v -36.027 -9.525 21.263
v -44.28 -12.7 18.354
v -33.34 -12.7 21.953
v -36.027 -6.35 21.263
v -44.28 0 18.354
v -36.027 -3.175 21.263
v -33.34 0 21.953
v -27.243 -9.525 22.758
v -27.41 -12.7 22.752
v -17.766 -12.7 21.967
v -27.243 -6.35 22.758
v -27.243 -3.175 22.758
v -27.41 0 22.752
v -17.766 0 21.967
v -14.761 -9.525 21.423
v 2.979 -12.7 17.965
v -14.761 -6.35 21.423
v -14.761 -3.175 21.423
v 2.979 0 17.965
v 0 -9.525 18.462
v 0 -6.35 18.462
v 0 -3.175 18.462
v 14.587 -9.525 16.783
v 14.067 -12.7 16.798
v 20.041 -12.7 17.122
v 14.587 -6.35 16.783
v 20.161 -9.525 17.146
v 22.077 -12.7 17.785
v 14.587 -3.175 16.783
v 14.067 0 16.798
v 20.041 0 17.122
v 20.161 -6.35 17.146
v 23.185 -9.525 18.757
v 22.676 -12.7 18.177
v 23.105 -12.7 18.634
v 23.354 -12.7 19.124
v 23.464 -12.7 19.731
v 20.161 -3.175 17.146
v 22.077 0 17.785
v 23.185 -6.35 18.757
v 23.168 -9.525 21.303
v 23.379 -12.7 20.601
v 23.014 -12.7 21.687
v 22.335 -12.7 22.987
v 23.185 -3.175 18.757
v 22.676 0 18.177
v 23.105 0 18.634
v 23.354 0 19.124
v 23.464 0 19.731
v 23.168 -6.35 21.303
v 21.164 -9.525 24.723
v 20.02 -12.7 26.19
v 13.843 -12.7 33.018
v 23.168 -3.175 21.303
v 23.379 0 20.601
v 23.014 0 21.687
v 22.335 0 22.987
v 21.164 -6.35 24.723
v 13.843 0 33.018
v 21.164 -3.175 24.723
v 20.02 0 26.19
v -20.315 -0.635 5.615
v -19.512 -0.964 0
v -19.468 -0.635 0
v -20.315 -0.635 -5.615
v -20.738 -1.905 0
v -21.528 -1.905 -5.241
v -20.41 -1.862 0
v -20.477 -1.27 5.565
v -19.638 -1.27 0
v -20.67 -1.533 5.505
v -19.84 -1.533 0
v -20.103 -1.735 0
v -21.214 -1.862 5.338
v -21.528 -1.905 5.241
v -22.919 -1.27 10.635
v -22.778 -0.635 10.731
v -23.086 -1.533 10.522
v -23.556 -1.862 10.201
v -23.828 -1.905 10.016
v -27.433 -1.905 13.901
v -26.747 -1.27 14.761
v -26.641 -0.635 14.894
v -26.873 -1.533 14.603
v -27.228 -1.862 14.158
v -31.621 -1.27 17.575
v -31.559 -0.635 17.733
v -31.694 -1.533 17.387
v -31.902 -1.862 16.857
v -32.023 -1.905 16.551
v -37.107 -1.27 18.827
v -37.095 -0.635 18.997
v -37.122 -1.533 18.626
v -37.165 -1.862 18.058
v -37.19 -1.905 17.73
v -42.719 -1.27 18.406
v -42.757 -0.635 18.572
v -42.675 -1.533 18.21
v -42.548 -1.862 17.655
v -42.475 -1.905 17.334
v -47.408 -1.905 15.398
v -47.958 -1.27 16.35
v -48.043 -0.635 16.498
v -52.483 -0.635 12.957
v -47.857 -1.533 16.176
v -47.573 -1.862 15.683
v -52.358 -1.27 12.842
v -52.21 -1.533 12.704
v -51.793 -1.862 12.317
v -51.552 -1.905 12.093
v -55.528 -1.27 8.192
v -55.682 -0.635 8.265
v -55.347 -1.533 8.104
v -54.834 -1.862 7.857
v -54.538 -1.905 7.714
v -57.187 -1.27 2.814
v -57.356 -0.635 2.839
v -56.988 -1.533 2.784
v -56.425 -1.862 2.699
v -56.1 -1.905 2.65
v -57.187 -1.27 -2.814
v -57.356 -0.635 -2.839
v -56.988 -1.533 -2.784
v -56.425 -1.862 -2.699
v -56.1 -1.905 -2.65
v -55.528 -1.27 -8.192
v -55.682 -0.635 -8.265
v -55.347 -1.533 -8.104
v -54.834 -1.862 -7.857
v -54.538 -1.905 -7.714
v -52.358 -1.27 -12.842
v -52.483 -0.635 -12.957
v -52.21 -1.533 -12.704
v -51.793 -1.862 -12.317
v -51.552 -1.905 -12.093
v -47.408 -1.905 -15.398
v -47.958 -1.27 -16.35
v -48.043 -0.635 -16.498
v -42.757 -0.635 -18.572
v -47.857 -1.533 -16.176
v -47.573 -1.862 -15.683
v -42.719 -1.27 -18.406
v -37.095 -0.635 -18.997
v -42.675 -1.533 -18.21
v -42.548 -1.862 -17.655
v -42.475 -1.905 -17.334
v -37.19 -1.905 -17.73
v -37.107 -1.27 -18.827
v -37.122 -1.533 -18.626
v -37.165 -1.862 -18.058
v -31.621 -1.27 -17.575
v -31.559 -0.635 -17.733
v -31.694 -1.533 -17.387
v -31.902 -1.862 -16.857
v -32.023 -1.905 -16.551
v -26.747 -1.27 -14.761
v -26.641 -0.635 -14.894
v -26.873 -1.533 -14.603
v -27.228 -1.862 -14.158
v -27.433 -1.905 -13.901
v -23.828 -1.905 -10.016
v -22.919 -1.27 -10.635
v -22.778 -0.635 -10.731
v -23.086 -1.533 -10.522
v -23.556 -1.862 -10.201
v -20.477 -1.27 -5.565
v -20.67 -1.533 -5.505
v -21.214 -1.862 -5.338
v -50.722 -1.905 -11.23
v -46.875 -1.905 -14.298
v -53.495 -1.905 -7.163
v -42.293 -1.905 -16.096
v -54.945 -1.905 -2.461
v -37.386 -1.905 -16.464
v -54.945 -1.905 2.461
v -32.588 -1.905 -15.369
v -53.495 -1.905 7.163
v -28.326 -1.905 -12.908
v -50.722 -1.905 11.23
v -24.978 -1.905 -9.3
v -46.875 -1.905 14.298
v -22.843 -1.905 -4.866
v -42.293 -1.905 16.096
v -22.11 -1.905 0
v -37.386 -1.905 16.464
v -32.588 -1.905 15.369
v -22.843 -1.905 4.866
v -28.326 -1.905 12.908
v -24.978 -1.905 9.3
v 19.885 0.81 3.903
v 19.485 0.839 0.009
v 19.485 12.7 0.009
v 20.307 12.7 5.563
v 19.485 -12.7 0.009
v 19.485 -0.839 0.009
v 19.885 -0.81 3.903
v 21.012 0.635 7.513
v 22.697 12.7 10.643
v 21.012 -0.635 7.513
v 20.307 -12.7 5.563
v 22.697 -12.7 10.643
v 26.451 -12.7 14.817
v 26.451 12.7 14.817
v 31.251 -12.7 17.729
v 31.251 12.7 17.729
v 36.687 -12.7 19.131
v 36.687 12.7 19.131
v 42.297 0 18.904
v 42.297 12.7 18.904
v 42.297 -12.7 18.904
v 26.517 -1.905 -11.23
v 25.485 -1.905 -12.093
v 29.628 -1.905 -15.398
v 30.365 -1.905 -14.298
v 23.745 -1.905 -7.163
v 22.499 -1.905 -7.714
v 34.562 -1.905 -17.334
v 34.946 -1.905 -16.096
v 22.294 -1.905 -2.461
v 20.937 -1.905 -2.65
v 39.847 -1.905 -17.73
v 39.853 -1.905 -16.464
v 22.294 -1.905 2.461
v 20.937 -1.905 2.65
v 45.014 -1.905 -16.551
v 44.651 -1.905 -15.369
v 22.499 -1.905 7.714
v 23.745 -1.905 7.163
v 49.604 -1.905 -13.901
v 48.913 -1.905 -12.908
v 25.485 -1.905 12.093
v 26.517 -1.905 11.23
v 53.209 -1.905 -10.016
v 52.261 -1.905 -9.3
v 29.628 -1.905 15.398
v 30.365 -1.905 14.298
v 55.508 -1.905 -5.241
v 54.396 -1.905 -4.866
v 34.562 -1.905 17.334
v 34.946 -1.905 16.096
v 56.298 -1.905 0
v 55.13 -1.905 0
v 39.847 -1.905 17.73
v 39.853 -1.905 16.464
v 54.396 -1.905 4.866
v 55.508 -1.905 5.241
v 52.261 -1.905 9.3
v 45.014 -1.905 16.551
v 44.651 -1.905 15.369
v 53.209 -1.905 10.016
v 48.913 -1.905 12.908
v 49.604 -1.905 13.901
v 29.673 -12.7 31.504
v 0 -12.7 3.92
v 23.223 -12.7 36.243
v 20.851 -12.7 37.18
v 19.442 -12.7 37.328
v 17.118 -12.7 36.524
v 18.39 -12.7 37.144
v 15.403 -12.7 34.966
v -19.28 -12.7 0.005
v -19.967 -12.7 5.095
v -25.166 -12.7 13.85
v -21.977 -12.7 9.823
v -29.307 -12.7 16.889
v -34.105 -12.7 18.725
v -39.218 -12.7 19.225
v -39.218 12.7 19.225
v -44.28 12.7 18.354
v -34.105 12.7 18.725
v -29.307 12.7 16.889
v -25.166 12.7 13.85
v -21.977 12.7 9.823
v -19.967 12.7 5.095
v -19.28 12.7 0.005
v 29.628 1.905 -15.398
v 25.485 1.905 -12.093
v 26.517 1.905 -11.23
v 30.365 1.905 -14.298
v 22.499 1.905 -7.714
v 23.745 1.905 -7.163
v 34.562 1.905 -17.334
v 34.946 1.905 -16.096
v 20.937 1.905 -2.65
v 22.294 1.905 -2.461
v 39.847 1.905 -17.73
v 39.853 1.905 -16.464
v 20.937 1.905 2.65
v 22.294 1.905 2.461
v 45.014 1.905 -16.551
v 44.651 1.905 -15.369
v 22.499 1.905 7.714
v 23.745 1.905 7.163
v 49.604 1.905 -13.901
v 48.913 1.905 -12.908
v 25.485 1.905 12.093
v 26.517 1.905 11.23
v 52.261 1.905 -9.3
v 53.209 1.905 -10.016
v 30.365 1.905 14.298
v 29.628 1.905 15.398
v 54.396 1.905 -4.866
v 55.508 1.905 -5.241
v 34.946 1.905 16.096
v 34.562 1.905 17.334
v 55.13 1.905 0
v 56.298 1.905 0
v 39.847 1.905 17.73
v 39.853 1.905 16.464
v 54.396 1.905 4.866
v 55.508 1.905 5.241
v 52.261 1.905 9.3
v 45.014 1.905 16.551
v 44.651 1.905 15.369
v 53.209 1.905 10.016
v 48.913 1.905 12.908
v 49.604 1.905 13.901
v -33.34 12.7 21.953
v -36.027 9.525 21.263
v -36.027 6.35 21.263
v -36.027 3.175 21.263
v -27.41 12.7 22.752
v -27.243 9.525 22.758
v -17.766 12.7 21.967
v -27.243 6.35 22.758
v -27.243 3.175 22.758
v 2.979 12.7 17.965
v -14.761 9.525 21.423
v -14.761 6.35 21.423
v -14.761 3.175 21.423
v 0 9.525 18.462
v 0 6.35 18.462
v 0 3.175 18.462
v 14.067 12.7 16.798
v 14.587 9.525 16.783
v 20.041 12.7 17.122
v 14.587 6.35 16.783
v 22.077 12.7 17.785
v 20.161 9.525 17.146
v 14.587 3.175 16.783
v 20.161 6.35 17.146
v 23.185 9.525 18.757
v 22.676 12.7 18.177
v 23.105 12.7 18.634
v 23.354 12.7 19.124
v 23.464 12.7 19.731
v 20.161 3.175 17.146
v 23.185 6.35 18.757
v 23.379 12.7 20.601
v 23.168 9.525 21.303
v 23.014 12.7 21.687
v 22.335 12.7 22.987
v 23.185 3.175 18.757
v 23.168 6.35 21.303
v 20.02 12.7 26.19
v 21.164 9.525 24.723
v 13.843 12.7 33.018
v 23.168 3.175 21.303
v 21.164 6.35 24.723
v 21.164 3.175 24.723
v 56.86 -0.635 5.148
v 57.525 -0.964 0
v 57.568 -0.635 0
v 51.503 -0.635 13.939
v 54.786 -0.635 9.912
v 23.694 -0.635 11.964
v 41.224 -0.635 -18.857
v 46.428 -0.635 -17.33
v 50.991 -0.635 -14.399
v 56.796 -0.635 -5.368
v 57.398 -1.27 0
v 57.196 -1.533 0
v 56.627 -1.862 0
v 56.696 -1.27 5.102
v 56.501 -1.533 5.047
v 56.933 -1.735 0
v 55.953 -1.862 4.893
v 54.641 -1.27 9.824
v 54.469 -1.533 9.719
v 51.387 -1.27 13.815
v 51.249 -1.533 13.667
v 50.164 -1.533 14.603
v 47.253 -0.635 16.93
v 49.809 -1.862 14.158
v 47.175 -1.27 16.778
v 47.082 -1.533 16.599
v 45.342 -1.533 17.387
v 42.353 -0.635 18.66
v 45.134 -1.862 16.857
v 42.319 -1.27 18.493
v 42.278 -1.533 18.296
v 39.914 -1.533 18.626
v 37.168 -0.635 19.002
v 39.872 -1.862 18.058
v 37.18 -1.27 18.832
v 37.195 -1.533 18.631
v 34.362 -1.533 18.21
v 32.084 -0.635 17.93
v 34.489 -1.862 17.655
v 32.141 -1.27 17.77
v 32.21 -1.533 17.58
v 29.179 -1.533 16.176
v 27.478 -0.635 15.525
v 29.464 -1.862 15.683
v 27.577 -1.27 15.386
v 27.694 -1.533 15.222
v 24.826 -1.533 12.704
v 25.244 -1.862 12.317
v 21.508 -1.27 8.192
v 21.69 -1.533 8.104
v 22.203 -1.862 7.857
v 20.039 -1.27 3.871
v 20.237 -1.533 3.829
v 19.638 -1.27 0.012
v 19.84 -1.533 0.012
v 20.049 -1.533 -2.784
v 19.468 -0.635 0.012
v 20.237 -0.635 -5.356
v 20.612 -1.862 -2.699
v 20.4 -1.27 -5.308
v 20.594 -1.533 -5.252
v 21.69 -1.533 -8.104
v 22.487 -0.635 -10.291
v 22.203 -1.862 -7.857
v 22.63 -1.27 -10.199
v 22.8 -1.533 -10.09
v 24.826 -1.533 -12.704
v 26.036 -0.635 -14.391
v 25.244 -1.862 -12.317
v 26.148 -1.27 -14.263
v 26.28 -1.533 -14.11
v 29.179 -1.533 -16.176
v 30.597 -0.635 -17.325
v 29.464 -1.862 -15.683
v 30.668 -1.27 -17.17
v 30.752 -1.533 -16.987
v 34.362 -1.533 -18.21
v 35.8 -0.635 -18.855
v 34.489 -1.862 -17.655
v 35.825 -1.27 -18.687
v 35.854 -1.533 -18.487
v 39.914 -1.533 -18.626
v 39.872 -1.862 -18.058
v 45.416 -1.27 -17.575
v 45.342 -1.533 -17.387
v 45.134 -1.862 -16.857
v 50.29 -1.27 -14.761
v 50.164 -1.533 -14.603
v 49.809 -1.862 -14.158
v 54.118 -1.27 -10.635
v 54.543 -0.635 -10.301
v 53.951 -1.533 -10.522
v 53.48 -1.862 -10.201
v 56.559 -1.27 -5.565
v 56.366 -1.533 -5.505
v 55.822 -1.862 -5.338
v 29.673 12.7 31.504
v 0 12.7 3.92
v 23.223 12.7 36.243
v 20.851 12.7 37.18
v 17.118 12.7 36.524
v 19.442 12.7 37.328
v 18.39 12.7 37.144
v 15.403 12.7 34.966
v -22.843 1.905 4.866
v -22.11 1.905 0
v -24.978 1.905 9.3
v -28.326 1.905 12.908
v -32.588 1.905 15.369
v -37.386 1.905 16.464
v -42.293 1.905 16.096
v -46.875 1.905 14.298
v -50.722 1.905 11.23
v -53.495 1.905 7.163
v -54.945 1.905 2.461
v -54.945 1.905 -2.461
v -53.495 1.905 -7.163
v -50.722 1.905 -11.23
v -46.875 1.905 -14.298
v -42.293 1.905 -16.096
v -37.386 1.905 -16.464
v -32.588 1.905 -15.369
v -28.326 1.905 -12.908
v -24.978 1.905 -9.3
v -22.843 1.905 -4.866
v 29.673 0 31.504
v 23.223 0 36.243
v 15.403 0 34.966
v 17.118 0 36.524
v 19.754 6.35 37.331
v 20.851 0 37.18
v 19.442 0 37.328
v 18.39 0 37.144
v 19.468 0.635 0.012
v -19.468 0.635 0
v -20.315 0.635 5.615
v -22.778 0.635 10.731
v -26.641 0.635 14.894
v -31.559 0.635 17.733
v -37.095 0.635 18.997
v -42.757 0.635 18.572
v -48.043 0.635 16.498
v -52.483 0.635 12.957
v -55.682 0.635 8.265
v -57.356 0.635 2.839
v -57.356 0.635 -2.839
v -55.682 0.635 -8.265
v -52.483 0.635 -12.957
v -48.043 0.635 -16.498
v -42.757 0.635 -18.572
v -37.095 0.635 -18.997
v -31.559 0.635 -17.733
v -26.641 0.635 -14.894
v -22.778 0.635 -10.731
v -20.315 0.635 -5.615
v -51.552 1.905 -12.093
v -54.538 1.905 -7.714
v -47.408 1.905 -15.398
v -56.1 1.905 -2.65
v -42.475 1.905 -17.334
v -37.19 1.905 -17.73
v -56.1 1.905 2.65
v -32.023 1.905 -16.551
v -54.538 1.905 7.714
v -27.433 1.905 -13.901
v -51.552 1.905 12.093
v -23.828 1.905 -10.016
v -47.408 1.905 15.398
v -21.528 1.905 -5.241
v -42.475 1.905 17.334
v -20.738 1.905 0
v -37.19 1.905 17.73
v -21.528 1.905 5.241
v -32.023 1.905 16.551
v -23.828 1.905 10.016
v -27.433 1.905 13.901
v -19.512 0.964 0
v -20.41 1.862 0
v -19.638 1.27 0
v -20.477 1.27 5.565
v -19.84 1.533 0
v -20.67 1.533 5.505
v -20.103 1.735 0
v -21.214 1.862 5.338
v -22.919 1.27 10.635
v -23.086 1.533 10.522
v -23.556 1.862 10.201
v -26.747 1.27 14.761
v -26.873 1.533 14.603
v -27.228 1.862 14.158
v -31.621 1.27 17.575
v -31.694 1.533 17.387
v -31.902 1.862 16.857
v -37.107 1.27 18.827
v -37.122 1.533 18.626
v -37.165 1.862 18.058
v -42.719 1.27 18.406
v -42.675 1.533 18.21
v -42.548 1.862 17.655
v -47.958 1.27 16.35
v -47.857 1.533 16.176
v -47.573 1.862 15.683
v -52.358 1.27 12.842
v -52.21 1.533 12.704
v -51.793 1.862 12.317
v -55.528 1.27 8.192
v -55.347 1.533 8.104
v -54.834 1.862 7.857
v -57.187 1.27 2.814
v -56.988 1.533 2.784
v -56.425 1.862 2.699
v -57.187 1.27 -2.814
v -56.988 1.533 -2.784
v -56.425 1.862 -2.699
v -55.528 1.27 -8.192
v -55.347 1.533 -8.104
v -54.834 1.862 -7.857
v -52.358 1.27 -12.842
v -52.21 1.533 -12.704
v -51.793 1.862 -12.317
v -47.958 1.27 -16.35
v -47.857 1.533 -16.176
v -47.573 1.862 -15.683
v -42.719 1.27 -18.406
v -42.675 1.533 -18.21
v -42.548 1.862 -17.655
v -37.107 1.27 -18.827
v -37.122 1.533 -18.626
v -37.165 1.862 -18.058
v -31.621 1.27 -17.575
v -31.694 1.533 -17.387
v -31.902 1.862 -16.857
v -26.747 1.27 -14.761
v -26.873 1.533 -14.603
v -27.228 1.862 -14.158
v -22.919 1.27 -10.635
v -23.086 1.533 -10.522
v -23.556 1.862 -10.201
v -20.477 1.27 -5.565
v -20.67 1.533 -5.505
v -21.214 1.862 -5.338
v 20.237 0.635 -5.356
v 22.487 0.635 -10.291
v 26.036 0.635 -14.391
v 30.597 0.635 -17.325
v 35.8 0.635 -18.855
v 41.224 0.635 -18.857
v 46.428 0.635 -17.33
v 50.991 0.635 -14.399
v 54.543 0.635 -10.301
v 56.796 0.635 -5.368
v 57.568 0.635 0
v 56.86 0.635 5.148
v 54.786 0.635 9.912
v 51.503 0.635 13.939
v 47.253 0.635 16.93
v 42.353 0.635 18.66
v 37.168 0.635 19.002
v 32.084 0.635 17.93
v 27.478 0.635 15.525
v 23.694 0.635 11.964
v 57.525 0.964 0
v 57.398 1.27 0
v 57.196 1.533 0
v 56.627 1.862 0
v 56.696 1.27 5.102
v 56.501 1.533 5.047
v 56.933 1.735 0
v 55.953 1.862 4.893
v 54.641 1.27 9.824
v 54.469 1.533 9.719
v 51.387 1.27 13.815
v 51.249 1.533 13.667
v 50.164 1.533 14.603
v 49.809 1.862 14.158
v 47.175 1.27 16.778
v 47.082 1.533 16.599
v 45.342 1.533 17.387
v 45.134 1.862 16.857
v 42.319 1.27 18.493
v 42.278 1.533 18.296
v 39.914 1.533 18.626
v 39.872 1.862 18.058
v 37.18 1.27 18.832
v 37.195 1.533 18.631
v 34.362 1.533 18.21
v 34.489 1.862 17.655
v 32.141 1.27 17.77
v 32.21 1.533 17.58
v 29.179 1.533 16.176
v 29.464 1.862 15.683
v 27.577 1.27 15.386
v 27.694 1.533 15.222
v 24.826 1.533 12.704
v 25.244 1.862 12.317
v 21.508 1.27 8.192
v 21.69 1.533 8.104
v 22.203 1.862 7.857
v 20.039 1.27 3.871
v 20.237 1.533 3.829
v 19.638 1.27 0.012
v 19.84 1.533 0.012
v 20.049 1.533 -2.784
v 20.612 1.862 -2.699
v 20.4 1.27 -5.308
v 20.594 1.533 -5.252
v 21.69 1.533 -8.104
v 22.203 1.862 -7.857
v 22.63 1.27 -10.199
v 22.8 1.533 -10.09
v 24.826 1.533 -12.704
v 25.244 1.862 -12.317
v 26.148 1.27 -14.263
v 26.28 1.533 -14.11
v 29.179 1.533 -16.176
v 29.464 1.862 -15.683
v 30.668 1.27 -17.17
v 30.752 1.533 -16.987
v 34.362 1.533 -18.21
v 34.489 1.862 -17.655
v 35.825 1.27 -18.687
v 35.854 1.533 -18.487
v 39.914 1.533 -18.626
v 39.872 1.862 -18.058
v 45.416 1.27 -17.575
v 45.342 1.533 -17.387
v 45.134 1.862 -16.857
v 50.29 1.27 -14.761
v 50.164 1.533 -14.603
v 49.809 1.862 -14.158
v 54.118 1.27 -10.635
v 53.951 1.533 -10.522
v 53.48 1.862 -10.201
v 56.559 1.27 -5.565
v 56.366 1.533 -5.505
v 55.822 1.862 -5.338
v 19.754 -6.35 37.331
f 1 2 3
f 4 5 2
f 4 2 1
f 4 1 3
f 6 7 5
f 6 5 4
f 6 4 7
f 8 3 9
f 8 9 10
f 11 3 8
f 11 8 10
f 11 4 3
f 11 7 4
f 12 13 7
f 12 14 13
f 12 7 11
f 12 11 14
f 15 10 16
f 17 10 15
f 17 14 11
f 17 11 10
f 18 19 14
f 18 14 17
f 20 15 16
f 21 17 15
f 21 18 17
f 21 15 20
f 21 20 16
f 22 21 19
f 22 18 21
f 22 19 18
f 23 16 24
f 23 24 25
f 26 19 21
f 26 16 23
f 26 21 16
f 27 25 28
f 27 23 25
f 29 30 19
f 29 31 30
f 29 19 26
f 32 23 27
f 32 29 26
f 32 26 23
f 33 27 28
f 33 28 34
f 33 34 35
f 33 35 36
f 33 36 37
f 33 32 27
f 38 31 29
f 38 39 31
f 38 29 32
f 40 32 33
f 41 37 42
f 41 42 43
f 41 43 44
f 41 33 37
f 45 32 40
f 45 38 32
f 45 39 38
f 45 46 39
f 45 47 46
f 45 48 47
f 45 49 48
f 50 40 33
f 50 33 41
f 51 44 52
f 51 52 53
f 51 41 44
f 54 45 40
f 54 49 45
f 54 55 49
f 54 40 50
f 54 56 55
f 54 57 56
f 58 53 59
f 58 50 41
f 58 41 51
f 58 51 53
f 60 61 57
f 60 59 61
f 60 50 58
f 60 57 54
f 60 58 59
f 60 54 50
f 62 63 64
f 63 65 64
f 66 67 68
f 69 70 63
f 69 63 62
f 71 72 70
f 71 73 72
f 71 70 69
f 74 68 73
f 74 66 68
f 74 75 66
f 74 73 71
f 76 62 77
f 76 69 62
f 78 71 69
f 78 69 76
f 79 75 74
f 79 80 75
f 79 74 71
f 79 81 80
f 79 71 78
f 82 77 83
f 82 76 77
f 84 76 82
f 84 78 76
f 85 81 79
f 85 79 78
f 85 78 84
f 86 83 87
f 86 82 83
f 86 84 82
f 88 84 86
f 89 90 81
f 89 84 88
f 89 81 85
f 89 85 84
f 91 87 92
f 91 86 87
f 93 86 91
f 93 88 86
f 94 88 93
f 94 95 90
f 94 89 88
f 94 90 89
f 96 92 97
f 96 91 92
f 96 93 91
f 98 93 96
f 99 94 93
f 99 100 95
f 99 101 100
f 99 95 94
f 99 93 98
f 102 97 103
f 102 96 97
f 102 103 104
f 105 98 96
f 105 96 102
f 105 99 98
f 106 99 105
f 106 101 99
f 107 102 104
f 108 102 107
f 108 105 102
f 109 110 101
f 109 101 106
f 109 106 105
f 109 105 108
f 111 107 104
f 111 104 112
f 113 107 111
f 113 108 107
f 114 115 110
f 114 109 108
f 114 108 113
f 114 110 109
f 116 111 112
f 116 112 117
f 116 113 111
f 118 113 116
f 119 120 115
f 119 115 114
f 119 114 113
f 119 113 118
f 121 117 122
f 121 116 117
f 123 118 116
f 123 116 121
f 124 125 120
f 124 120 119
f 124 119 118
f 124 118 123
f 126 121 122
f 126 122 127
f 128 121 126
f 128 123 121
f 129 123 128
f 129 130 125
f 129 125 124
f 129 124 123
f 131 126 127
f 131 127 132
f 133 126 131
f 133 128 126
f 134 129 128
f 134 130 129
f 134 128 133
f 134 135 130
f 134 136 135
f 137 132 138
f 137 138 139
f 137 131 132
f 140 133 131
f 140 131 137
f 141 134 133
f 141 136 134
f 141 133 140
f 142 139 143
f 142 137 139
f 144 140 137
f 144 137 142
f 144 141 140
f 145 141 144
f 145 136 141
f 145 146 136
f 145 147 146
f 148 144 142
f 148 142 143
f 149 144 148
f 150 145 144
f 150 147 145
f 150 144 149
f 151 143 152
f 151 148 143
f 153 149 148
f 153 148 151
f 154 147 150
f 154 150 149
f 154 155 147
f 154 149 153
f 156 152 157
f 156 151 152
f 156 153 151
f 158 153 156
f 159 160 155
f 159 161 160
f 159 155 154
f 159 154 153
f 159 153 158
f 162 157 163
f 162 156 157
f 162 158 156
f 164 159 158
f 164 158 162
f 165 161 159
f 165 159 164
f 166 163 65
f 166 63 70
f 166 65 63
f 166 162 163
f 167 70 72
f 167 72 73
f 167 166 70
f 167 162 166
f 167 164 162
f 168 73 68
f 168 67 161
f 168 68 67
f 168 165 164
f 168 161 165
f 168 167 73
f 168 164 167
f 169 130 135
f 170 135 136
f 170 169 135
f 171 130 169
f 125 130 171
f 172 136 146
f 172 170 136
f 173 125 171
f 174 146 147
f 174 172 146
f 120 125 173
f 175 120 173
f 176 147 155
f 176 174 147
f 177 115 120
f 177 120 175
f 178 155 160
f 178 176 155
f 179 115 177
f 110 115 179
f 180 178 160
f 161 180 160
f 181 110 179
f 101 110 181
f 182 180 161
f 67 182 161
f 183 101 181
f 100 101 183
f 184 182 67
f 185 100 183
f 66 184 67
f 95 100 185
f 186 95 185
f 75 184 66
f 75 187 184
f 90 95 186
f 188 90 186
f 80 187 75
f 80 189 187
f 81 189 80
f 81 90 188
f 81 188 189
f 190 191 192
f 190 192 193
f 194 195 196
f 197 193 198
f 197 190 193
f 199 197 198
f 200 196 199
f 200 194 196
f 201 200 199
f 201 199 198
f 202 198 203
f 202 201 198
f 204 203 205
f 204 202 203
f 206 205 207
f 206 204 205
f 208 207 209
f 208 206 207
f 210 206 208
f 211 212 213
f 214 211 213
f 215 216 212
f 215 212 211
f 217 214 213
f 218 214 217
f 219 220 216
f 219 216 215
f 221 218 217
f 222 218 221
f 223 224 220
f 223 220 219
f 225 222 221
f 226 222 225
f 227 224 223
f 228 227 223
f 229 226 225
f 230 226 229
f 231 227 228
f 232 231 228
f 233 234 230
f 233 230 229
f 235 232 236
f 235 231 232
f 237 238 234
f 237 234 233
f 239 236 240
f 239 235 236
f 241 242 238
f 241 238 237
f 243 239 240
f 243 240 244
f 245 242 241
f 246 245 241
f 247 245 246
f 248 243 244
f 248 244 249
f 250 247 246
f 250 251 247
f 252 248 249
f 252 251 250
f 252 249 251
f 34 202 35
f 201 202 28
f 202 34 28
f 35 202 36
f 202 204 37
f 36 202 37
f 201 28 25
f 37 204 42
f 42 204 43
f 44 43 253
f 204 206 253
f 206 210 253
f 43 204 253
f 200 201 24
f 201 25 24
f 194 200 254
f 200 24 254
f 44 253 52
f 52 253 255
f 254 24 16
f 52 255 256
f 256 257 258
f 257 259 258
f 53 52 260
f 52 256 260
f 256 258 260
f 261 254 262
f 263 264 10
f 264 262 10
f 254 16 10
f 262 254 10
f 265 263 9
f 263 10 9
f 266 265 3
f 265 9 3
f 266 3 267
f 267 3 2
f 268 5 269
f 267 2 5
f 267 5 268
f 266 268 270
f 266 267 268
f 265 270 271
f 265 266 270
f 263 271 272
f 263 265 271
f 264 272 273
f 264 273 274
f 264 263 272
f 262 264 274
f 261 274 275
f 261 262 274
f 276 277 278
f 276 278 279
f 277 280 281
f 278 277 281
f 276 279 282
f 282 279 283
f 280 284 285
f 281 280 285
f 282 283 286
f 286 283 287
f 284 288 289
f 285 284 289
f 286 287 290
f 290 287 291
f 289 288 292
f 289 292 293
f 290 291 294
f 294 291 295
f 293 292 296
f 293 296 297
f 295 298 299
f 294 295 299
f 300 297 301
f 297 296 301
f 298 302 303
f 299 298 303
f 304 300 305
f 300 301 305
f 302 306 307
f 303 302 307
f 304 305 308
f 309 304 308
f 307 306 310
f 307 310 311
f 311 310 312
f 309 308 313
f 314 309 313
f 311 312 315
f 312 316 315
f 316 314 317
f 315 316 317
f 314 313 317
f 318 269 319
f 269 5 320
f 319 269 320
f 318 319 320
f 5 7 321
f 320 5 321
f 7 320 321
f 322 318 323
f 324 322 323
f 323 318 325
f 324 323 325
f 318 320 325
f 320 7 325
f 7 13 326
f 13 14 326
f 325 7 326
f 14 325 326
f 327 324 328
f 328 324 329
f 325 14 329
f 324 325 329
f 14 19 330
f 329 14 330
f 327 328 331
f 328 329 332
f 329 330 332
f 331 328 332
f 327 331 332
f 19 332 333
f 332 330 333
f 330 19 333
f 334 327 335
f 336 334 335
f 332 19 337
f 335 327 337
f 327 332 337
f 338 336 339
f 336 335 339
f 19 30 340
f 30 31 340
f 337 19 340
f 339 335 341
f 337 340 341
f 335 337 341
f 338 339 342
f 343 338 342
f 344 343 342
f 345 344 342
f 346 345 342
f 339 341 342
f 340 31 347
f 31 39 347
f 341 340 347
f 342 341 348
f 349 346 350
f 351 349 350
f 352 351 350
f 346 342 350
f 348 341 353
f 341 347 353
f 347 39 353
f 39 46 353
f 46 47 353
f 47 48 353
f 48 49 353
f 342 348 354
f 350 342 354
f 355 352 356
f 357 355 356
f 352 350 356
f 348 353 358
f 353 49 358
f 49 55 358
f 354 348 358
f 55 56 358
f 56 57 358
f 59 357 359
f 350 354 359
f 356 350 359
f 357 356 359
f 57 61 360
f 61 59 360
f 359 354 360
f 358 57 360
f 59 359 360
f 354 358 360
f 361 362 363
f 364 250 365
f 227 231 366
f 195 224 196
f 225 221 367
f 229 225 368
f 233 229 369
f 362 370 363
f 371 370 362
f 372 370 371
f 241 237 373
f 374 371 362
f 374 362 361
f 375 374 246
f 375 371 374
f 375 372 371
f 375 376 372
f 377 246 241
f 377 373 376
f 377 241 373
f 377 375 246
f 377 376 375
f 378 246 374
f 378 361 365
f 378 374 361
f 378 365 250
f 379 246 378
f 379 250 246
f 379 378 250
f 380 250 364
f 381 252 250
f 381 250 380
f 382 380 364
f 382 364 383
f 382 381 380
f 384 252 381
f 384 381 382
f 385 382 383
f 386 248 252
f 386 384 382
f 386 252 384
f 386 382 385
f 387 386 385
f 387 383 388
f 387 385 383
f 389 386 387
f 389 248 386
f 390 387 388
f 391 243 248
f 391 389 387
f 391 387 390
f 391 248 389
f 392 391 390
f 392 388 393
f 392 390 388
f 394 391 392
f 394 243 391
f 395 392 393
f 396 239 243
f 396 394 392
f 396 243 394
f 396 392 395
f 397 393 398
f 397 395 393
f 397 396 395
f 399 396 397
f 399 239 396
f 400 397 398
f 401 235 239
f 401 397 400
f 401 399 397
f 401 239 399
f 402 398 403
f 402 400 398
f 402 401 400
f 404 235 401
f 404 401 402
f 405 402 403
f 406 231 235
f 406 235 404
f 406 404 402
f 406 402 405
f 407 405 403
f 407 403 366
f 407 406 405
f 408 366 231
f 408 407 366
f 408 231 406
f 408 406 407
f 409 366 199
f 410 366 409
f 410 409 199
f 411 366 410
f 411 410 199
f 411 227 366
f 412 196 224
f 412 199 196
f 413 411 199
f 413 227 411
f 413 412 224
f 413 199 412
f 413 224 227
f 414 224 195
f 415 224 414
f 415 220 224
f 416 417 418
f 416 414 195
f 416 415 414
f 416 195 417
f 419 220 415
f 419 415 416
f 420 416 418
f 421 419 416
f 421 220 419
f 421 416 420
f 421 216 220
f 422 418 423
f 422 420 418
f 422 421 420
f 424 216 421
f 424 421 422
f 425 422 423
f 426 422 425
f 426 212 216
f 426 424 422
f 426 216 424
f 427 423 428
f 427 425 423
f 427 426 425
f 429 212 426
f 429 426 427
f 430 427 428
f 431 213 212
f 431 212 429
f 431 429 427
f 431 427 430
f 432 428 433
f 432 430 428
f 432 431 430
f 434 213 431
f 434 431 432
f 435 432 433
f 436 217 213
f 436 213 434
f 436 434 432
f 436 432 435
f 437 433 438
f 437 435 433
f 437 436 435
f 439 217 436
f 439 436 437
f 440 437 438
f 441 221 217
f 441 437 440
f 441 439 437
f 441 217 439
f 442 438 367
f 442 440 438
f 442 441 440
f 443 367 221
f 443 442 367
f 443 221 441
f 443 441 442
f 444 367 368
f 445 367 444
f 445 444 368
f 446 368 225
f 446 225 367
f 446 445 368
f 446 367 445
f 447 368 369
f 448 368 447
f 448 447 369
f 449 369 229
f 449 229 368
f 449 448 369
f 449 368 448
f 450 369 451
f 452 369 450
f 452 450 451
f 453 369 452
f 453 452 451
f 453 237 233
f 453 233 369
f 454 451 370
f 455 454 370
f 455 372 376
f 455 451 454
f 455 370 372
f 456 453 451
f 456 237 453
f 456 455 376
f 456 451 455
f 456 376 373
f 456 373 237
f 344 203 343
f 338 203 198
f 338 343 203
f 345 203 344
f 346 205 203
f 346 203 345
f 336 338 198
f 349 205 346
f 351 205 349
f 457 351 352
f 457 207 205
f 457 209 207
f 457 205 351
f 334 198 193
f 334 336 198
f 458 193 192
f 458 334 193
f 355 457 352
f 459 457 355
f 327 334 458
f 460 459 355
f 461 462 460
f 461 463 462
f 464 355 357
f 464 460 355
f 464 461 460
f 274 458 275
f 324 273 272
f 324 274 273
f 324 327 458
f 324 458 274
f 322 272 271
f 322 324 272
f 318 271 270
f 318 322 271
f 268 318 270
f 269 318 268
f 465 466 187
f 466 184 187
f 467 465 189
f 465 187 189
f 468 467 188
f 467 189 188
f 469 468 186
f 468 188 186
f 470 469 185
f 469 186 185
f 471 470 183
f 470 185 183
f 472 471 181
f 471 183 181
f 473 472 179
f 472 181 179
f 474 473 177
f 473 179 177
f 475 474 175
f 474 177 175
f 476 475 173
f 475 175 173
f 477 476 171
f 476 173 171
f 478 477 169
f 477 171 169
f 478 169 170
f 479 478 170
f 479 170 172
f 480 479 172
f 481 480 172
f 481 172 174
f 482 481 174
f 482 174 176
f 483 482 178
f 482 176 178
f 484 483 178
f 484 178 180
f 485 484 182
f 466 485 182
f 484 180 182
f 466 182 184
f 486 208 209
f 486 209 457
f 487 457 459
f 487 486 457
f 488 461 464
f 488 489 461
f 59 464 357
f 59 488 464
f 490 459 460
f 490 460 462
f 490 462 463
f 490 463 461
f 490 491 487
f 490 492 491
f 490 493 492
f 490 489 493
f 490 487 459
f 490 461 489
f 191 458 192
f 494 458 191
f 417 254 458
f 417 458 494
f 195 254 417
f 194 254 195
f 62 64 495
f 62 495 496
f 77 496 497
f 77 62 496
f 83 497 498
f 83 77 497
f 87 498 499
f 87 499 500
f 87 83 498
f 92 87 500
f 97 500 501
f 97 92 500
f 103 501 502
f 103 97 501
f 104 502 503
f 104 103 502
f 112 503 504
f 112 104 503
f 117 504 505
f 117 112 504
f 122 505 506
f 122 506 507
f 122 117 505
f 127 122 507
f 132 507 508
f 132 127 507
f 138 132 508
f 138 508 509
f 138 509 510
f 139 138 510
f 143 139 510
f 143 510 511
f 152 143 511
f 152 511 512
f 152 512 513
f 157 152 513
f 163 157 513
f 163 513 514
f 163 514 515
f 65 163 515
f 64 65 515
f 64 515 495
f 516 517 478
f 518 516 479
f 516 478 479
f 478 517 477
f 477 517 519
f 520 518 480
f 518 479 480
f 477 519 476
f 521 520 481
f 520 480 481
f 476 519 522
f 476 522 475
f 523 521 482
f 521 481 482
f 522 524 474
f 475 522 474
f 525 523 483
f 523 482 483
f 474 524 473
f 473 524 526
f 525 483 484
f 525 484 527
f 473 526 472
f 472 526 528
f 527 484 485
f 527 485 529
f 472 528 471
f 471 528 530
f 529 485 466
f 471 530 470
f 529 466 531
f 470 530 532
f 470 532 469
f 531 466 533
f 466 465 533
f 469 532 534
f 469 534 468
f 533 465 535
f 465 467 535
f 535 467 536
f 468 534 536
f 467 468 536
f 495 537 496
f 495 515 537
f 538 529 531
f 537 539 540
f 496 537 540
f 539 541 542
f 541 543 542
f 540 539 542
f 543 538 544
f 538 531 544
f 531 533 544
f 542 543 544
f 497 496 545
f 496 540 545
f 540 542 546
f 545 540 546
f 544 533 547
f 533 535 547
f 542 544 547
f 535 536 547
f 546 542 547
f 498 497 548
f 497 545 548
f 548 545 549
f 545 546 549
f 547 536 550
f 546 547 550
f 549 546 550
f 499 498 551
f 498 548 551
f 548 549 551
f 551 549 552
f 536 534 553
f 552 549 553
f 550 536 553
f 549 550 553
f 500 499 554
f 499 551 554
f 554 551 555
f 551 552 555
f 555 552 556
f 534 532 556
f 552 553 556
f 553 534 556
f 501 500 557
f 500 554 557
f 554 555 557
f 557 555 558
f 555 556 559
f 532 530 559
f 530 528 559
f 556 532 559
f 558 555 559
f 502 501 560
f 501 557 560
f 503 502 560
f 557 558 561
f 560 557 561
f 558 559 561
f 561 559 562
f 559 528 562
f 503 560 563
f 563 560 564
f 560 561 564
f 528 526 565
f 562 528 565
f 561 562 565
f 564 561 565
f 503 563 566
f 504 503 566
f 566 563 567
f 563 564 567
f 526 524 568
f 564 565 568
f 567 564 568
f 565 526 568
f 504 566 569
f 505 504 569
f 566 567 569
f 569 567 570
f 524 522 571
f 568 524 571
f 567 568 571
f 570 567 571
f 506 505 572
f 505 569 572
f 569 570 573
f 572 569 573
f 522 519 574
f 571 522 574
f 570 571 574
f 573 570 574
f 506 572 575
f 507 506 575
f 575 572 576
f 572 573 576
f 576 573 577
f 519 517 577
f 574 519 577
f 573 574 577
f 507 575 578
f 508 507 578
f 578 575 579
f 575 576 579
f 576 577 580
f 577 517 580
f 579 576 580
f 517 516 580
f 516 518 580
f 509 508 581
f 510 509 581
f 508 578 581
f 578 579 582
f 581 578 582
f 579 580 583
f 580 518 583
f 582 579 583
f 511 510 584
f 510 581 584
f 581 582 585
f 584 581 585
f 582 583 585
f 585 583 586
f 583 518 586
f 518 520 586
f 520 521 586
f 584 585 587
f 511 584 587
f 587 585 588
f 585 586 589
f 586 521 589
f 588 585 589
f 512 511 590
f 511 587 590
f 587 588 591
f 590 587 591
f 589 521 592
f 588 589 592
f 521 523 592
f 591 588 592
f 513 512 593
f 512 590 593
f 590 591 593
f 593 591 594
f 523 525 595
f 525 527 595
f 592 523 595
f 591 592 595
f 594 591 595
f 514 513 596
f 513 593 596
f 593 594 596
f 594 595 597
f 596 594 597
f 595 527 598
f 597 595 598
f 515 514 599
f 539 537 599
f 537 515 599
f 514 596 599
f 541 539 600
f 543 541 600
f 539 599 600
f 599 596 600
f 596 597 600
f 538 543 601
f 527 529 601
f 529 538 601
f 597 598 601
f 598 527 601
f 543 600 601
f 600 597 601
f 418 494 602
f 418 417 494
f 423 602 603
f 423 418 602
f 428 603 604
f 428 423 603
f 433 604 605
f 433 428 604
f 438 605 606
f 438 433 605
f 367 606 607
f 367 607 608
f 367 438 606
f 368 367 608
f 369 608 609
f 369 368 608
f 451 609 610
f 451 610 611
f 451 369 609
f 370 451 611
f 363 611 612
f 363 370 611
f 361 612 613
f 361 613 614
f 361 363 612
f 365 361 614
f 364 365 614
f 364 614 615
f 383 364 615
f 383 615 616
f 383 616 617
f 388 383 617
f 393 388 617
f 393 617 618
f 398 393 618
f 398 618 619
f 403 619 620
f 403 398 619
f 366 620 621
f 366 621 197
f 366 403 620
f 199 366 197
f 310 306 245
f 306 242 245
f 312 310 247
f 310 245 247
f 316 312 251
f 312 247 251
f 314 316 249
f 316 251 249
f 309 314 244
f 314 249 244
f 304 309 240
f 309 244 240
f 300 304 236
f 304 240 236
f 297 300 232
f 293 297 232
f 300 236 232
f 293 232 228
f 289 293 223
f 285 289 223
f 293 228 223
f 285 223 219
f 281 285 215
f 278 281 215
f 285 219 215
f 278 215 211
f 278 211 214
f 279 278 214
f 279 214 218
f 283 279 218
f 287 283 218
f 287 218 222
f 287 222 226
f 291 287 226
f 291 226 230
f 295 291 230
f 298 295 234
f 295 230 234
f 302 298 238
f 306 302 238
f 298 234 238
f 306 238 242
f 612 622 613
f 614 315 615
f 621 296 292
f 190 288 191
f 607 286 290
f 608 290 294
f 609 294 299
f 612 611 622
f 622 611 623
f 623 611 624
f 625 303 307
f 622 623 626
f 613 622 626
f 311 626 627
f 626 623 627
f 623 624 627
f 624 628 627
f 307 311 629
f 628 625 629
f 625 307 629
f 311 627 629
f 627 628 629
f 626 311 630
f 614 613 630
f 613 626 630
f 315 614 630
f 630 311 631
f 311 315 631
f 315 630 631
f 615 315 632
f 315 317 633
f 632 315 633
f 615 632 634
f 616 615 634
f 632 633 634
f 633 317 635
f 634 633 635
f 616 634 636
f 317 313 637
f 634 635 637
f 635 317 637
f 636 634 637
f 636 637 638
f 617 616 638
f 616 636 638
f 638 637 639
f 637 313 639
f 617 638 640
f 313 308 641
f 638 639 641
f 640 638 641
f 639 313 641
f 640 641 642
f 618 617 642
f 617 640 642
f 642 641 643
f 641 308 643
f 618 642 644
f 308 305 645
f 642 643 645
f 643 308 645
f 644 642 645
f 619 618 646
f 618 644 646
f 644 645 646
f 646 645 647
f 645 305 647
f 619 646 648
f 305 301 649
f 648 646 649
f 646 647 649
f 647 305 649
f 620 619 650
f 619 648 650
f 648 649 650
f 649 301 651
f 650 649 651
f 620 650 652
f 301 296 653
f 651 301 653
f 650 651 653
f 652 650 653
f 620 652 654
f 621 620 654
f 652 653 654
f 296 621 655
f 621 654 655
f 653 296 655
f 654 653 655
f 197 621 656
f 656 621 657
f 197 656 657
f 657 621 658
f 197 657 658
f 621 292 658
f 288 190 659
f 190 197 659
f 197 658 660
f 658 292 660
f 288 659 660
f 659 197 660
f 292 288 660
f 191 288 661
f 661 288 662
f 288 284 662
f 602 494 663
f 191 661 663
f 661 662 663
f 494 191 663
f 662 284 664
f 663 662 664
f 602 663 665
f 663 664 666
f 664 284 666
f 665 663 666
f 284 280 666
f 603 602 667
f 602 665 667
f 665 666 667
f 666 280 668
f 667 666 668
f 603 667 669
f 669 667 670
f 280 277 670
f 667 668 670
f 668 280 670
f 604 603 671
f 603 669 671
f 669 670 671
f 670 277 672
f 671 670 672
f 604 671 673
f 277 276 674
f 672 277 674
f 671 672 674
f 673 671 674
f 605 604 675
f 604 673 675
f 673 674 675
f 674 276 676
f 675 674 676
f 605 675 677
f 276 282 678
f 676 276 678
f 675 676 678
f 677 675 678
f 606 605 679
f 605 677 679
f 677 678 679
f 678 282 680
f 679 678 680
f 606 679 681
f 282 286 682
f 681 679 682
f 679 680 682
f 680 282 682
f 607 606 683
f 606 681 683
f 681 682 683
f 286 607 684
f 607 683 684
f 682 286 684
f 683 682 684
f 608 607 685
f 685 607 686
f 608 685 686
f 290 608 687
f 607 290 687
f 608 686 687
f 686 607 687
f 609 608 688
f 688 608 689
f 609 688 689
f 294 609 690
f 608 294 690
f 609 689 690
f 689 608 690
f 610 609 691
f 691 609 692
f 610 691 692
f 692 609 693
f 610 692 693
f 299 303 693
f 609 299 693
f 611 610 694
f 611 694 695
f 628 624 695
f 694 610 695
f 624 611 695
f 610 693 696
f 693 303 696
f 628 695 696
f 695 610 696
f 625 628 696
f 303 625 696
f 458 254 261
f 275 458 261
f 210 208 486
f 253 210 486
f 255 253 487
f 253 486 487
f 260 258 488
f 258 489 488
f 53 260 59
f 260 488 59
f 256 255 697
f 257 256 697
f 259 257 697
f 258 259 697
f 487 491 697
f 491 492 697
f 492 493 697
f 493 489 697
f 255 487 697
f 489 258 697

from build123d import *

# Parameters (mm, degrees)
F0_R     = 19.05
F2_DEPTH = 1.905
F1_R     = 16.51
F3_DEPTH = 2.54
F4_R     = 1.27
F4_2_R   = 1.27
F6_DEPTH = 12.7


with BuildPart() as f2:
    # F0 (on Front) → F2 (new body, symmetric)
    with BuildSketch(Plane.XZ):
        with Locations((-38.5182765663, 0)):
            Circle(F0_R)
    extrude(amount=F2_DEPTH, both=True)


with BuildPart() as f2b:
    # F0 (on Front) → F2, piece 2 (new body, symmetric)
    with BuildSketch(Plane.XZ):
        with Locations((38.5182765663, 0)):
            Circle(F0_R)
    extrude(amount=F2_DEPTH, both=True)


with BuildPart() as f3_tool:
    # F1 (on face) → F3 (new body, symmetric)
    with BuildSketch(Plane.XZ):
        with Locations((38.6195555329, 0)):
            Circle(F1_R)
        with Locations((-38.6195555329, 0)):
            Circle(F1_R)
    extrude(amount=F3_DEPTH, both=True)


with BuildPart() as f2_1:
    add(f2.part)

    # F3: cut by f3_tool
    add(f3_tool.part, mode=Mode.SUBTRACT)

    # F4#2
    f4_2_edges = [f2_1.edges().sort_by_distance(p)[0] for p in [
        (-57.568277, 1.905, 0),
        (-19.468277, 0, 0),
        (-57.568277, -1.905, 0),
    ]]
    fillet(f4_2_edges, radius=F4_2_R)


with BuildPart() as f2b_1:
    add(f2b.part)

    # F3: cut by f3_tool
    add(f3_tool.part, mode=Mode.SUBTRACT)

    # F4
    f4_edges = [f2b_1.edges().sort_by_distance(p)[0] for p in [
        (19.468277, 1.905, 0),
        (57.568277, 0, 0),
        (19.468277, -1.905, 0),
    ]]
    fillet(f4_edges, radius=F4_R)

    # F5 (on Front) → F6 (join, symmetric)
    with BuildSketch(Plane.XZ):
        with BuildLine():
            add(Edge.make_bspline(
                [(0, 3.9196209982), (-6.4268043758, 2.6146205321), (-12.8536087516, 1.309620066), (-19.2804131273, 0.0046195999)],
                knots=[0, 0, 0, 0, 19.6738803064, 19.6738803064, 19.6738803064, 19.6738803064], degree=3))
            add(Edge.make_bspline(
                [(0, 3.9196209982), (6.4949218626, 2.6161152738), (12.9898437253, 1.3126095494), (19.4847655879, 0.009103825)],
                knots=[0, 0, 0, 0, 19.8733045711, 19.8733045711, 19.8733045711, 19.8733045711], degree=3))
            ThreePointArc((19.4847655879, 0.009103825), (26.4514170766, 14.8165091154), (42.2970348293, 18.9042814226))
            add(Edge.make_bspline(
                [(42.2970348293, 18.9042814226), (33.5903418059, 28.0510053397), (20.515711515, 41.7725961089), (15.5136982582, 35.2098816799), (13.8429980725, 33.017642796)],
                knots=[0, 0, 0, 0, 0.6660737612, 1, 1, 1, 1], degree=3))
            add(Edge.make_bspline(
                [(-44.2804308585, 18.3542078324), (-38.8384670005, 20.4549004159), (-26.5756975332, 25.1575808274), (-2.6672938705, 17.914753007), (31.1611473272, 14.689593773), (19.3125454437, 27.2292838492), (13.8429980725, 33.017642796)],
                knots=[0, 0, 0, 0, 0.2281019359, 0.5136587523, 0.7754894608, 1, 1, 1, 1], degree=3))
            ThreePointArc((-44.2804308585, 18.3542078324), (-27.1350207702, 15.5084447257), (-19.2804131273, 0.0046195999))
        make_face()
    extrude(amount=F6_DEPTH, both=True)


solid = Compound([f2_1.part, f2b_1.part])
